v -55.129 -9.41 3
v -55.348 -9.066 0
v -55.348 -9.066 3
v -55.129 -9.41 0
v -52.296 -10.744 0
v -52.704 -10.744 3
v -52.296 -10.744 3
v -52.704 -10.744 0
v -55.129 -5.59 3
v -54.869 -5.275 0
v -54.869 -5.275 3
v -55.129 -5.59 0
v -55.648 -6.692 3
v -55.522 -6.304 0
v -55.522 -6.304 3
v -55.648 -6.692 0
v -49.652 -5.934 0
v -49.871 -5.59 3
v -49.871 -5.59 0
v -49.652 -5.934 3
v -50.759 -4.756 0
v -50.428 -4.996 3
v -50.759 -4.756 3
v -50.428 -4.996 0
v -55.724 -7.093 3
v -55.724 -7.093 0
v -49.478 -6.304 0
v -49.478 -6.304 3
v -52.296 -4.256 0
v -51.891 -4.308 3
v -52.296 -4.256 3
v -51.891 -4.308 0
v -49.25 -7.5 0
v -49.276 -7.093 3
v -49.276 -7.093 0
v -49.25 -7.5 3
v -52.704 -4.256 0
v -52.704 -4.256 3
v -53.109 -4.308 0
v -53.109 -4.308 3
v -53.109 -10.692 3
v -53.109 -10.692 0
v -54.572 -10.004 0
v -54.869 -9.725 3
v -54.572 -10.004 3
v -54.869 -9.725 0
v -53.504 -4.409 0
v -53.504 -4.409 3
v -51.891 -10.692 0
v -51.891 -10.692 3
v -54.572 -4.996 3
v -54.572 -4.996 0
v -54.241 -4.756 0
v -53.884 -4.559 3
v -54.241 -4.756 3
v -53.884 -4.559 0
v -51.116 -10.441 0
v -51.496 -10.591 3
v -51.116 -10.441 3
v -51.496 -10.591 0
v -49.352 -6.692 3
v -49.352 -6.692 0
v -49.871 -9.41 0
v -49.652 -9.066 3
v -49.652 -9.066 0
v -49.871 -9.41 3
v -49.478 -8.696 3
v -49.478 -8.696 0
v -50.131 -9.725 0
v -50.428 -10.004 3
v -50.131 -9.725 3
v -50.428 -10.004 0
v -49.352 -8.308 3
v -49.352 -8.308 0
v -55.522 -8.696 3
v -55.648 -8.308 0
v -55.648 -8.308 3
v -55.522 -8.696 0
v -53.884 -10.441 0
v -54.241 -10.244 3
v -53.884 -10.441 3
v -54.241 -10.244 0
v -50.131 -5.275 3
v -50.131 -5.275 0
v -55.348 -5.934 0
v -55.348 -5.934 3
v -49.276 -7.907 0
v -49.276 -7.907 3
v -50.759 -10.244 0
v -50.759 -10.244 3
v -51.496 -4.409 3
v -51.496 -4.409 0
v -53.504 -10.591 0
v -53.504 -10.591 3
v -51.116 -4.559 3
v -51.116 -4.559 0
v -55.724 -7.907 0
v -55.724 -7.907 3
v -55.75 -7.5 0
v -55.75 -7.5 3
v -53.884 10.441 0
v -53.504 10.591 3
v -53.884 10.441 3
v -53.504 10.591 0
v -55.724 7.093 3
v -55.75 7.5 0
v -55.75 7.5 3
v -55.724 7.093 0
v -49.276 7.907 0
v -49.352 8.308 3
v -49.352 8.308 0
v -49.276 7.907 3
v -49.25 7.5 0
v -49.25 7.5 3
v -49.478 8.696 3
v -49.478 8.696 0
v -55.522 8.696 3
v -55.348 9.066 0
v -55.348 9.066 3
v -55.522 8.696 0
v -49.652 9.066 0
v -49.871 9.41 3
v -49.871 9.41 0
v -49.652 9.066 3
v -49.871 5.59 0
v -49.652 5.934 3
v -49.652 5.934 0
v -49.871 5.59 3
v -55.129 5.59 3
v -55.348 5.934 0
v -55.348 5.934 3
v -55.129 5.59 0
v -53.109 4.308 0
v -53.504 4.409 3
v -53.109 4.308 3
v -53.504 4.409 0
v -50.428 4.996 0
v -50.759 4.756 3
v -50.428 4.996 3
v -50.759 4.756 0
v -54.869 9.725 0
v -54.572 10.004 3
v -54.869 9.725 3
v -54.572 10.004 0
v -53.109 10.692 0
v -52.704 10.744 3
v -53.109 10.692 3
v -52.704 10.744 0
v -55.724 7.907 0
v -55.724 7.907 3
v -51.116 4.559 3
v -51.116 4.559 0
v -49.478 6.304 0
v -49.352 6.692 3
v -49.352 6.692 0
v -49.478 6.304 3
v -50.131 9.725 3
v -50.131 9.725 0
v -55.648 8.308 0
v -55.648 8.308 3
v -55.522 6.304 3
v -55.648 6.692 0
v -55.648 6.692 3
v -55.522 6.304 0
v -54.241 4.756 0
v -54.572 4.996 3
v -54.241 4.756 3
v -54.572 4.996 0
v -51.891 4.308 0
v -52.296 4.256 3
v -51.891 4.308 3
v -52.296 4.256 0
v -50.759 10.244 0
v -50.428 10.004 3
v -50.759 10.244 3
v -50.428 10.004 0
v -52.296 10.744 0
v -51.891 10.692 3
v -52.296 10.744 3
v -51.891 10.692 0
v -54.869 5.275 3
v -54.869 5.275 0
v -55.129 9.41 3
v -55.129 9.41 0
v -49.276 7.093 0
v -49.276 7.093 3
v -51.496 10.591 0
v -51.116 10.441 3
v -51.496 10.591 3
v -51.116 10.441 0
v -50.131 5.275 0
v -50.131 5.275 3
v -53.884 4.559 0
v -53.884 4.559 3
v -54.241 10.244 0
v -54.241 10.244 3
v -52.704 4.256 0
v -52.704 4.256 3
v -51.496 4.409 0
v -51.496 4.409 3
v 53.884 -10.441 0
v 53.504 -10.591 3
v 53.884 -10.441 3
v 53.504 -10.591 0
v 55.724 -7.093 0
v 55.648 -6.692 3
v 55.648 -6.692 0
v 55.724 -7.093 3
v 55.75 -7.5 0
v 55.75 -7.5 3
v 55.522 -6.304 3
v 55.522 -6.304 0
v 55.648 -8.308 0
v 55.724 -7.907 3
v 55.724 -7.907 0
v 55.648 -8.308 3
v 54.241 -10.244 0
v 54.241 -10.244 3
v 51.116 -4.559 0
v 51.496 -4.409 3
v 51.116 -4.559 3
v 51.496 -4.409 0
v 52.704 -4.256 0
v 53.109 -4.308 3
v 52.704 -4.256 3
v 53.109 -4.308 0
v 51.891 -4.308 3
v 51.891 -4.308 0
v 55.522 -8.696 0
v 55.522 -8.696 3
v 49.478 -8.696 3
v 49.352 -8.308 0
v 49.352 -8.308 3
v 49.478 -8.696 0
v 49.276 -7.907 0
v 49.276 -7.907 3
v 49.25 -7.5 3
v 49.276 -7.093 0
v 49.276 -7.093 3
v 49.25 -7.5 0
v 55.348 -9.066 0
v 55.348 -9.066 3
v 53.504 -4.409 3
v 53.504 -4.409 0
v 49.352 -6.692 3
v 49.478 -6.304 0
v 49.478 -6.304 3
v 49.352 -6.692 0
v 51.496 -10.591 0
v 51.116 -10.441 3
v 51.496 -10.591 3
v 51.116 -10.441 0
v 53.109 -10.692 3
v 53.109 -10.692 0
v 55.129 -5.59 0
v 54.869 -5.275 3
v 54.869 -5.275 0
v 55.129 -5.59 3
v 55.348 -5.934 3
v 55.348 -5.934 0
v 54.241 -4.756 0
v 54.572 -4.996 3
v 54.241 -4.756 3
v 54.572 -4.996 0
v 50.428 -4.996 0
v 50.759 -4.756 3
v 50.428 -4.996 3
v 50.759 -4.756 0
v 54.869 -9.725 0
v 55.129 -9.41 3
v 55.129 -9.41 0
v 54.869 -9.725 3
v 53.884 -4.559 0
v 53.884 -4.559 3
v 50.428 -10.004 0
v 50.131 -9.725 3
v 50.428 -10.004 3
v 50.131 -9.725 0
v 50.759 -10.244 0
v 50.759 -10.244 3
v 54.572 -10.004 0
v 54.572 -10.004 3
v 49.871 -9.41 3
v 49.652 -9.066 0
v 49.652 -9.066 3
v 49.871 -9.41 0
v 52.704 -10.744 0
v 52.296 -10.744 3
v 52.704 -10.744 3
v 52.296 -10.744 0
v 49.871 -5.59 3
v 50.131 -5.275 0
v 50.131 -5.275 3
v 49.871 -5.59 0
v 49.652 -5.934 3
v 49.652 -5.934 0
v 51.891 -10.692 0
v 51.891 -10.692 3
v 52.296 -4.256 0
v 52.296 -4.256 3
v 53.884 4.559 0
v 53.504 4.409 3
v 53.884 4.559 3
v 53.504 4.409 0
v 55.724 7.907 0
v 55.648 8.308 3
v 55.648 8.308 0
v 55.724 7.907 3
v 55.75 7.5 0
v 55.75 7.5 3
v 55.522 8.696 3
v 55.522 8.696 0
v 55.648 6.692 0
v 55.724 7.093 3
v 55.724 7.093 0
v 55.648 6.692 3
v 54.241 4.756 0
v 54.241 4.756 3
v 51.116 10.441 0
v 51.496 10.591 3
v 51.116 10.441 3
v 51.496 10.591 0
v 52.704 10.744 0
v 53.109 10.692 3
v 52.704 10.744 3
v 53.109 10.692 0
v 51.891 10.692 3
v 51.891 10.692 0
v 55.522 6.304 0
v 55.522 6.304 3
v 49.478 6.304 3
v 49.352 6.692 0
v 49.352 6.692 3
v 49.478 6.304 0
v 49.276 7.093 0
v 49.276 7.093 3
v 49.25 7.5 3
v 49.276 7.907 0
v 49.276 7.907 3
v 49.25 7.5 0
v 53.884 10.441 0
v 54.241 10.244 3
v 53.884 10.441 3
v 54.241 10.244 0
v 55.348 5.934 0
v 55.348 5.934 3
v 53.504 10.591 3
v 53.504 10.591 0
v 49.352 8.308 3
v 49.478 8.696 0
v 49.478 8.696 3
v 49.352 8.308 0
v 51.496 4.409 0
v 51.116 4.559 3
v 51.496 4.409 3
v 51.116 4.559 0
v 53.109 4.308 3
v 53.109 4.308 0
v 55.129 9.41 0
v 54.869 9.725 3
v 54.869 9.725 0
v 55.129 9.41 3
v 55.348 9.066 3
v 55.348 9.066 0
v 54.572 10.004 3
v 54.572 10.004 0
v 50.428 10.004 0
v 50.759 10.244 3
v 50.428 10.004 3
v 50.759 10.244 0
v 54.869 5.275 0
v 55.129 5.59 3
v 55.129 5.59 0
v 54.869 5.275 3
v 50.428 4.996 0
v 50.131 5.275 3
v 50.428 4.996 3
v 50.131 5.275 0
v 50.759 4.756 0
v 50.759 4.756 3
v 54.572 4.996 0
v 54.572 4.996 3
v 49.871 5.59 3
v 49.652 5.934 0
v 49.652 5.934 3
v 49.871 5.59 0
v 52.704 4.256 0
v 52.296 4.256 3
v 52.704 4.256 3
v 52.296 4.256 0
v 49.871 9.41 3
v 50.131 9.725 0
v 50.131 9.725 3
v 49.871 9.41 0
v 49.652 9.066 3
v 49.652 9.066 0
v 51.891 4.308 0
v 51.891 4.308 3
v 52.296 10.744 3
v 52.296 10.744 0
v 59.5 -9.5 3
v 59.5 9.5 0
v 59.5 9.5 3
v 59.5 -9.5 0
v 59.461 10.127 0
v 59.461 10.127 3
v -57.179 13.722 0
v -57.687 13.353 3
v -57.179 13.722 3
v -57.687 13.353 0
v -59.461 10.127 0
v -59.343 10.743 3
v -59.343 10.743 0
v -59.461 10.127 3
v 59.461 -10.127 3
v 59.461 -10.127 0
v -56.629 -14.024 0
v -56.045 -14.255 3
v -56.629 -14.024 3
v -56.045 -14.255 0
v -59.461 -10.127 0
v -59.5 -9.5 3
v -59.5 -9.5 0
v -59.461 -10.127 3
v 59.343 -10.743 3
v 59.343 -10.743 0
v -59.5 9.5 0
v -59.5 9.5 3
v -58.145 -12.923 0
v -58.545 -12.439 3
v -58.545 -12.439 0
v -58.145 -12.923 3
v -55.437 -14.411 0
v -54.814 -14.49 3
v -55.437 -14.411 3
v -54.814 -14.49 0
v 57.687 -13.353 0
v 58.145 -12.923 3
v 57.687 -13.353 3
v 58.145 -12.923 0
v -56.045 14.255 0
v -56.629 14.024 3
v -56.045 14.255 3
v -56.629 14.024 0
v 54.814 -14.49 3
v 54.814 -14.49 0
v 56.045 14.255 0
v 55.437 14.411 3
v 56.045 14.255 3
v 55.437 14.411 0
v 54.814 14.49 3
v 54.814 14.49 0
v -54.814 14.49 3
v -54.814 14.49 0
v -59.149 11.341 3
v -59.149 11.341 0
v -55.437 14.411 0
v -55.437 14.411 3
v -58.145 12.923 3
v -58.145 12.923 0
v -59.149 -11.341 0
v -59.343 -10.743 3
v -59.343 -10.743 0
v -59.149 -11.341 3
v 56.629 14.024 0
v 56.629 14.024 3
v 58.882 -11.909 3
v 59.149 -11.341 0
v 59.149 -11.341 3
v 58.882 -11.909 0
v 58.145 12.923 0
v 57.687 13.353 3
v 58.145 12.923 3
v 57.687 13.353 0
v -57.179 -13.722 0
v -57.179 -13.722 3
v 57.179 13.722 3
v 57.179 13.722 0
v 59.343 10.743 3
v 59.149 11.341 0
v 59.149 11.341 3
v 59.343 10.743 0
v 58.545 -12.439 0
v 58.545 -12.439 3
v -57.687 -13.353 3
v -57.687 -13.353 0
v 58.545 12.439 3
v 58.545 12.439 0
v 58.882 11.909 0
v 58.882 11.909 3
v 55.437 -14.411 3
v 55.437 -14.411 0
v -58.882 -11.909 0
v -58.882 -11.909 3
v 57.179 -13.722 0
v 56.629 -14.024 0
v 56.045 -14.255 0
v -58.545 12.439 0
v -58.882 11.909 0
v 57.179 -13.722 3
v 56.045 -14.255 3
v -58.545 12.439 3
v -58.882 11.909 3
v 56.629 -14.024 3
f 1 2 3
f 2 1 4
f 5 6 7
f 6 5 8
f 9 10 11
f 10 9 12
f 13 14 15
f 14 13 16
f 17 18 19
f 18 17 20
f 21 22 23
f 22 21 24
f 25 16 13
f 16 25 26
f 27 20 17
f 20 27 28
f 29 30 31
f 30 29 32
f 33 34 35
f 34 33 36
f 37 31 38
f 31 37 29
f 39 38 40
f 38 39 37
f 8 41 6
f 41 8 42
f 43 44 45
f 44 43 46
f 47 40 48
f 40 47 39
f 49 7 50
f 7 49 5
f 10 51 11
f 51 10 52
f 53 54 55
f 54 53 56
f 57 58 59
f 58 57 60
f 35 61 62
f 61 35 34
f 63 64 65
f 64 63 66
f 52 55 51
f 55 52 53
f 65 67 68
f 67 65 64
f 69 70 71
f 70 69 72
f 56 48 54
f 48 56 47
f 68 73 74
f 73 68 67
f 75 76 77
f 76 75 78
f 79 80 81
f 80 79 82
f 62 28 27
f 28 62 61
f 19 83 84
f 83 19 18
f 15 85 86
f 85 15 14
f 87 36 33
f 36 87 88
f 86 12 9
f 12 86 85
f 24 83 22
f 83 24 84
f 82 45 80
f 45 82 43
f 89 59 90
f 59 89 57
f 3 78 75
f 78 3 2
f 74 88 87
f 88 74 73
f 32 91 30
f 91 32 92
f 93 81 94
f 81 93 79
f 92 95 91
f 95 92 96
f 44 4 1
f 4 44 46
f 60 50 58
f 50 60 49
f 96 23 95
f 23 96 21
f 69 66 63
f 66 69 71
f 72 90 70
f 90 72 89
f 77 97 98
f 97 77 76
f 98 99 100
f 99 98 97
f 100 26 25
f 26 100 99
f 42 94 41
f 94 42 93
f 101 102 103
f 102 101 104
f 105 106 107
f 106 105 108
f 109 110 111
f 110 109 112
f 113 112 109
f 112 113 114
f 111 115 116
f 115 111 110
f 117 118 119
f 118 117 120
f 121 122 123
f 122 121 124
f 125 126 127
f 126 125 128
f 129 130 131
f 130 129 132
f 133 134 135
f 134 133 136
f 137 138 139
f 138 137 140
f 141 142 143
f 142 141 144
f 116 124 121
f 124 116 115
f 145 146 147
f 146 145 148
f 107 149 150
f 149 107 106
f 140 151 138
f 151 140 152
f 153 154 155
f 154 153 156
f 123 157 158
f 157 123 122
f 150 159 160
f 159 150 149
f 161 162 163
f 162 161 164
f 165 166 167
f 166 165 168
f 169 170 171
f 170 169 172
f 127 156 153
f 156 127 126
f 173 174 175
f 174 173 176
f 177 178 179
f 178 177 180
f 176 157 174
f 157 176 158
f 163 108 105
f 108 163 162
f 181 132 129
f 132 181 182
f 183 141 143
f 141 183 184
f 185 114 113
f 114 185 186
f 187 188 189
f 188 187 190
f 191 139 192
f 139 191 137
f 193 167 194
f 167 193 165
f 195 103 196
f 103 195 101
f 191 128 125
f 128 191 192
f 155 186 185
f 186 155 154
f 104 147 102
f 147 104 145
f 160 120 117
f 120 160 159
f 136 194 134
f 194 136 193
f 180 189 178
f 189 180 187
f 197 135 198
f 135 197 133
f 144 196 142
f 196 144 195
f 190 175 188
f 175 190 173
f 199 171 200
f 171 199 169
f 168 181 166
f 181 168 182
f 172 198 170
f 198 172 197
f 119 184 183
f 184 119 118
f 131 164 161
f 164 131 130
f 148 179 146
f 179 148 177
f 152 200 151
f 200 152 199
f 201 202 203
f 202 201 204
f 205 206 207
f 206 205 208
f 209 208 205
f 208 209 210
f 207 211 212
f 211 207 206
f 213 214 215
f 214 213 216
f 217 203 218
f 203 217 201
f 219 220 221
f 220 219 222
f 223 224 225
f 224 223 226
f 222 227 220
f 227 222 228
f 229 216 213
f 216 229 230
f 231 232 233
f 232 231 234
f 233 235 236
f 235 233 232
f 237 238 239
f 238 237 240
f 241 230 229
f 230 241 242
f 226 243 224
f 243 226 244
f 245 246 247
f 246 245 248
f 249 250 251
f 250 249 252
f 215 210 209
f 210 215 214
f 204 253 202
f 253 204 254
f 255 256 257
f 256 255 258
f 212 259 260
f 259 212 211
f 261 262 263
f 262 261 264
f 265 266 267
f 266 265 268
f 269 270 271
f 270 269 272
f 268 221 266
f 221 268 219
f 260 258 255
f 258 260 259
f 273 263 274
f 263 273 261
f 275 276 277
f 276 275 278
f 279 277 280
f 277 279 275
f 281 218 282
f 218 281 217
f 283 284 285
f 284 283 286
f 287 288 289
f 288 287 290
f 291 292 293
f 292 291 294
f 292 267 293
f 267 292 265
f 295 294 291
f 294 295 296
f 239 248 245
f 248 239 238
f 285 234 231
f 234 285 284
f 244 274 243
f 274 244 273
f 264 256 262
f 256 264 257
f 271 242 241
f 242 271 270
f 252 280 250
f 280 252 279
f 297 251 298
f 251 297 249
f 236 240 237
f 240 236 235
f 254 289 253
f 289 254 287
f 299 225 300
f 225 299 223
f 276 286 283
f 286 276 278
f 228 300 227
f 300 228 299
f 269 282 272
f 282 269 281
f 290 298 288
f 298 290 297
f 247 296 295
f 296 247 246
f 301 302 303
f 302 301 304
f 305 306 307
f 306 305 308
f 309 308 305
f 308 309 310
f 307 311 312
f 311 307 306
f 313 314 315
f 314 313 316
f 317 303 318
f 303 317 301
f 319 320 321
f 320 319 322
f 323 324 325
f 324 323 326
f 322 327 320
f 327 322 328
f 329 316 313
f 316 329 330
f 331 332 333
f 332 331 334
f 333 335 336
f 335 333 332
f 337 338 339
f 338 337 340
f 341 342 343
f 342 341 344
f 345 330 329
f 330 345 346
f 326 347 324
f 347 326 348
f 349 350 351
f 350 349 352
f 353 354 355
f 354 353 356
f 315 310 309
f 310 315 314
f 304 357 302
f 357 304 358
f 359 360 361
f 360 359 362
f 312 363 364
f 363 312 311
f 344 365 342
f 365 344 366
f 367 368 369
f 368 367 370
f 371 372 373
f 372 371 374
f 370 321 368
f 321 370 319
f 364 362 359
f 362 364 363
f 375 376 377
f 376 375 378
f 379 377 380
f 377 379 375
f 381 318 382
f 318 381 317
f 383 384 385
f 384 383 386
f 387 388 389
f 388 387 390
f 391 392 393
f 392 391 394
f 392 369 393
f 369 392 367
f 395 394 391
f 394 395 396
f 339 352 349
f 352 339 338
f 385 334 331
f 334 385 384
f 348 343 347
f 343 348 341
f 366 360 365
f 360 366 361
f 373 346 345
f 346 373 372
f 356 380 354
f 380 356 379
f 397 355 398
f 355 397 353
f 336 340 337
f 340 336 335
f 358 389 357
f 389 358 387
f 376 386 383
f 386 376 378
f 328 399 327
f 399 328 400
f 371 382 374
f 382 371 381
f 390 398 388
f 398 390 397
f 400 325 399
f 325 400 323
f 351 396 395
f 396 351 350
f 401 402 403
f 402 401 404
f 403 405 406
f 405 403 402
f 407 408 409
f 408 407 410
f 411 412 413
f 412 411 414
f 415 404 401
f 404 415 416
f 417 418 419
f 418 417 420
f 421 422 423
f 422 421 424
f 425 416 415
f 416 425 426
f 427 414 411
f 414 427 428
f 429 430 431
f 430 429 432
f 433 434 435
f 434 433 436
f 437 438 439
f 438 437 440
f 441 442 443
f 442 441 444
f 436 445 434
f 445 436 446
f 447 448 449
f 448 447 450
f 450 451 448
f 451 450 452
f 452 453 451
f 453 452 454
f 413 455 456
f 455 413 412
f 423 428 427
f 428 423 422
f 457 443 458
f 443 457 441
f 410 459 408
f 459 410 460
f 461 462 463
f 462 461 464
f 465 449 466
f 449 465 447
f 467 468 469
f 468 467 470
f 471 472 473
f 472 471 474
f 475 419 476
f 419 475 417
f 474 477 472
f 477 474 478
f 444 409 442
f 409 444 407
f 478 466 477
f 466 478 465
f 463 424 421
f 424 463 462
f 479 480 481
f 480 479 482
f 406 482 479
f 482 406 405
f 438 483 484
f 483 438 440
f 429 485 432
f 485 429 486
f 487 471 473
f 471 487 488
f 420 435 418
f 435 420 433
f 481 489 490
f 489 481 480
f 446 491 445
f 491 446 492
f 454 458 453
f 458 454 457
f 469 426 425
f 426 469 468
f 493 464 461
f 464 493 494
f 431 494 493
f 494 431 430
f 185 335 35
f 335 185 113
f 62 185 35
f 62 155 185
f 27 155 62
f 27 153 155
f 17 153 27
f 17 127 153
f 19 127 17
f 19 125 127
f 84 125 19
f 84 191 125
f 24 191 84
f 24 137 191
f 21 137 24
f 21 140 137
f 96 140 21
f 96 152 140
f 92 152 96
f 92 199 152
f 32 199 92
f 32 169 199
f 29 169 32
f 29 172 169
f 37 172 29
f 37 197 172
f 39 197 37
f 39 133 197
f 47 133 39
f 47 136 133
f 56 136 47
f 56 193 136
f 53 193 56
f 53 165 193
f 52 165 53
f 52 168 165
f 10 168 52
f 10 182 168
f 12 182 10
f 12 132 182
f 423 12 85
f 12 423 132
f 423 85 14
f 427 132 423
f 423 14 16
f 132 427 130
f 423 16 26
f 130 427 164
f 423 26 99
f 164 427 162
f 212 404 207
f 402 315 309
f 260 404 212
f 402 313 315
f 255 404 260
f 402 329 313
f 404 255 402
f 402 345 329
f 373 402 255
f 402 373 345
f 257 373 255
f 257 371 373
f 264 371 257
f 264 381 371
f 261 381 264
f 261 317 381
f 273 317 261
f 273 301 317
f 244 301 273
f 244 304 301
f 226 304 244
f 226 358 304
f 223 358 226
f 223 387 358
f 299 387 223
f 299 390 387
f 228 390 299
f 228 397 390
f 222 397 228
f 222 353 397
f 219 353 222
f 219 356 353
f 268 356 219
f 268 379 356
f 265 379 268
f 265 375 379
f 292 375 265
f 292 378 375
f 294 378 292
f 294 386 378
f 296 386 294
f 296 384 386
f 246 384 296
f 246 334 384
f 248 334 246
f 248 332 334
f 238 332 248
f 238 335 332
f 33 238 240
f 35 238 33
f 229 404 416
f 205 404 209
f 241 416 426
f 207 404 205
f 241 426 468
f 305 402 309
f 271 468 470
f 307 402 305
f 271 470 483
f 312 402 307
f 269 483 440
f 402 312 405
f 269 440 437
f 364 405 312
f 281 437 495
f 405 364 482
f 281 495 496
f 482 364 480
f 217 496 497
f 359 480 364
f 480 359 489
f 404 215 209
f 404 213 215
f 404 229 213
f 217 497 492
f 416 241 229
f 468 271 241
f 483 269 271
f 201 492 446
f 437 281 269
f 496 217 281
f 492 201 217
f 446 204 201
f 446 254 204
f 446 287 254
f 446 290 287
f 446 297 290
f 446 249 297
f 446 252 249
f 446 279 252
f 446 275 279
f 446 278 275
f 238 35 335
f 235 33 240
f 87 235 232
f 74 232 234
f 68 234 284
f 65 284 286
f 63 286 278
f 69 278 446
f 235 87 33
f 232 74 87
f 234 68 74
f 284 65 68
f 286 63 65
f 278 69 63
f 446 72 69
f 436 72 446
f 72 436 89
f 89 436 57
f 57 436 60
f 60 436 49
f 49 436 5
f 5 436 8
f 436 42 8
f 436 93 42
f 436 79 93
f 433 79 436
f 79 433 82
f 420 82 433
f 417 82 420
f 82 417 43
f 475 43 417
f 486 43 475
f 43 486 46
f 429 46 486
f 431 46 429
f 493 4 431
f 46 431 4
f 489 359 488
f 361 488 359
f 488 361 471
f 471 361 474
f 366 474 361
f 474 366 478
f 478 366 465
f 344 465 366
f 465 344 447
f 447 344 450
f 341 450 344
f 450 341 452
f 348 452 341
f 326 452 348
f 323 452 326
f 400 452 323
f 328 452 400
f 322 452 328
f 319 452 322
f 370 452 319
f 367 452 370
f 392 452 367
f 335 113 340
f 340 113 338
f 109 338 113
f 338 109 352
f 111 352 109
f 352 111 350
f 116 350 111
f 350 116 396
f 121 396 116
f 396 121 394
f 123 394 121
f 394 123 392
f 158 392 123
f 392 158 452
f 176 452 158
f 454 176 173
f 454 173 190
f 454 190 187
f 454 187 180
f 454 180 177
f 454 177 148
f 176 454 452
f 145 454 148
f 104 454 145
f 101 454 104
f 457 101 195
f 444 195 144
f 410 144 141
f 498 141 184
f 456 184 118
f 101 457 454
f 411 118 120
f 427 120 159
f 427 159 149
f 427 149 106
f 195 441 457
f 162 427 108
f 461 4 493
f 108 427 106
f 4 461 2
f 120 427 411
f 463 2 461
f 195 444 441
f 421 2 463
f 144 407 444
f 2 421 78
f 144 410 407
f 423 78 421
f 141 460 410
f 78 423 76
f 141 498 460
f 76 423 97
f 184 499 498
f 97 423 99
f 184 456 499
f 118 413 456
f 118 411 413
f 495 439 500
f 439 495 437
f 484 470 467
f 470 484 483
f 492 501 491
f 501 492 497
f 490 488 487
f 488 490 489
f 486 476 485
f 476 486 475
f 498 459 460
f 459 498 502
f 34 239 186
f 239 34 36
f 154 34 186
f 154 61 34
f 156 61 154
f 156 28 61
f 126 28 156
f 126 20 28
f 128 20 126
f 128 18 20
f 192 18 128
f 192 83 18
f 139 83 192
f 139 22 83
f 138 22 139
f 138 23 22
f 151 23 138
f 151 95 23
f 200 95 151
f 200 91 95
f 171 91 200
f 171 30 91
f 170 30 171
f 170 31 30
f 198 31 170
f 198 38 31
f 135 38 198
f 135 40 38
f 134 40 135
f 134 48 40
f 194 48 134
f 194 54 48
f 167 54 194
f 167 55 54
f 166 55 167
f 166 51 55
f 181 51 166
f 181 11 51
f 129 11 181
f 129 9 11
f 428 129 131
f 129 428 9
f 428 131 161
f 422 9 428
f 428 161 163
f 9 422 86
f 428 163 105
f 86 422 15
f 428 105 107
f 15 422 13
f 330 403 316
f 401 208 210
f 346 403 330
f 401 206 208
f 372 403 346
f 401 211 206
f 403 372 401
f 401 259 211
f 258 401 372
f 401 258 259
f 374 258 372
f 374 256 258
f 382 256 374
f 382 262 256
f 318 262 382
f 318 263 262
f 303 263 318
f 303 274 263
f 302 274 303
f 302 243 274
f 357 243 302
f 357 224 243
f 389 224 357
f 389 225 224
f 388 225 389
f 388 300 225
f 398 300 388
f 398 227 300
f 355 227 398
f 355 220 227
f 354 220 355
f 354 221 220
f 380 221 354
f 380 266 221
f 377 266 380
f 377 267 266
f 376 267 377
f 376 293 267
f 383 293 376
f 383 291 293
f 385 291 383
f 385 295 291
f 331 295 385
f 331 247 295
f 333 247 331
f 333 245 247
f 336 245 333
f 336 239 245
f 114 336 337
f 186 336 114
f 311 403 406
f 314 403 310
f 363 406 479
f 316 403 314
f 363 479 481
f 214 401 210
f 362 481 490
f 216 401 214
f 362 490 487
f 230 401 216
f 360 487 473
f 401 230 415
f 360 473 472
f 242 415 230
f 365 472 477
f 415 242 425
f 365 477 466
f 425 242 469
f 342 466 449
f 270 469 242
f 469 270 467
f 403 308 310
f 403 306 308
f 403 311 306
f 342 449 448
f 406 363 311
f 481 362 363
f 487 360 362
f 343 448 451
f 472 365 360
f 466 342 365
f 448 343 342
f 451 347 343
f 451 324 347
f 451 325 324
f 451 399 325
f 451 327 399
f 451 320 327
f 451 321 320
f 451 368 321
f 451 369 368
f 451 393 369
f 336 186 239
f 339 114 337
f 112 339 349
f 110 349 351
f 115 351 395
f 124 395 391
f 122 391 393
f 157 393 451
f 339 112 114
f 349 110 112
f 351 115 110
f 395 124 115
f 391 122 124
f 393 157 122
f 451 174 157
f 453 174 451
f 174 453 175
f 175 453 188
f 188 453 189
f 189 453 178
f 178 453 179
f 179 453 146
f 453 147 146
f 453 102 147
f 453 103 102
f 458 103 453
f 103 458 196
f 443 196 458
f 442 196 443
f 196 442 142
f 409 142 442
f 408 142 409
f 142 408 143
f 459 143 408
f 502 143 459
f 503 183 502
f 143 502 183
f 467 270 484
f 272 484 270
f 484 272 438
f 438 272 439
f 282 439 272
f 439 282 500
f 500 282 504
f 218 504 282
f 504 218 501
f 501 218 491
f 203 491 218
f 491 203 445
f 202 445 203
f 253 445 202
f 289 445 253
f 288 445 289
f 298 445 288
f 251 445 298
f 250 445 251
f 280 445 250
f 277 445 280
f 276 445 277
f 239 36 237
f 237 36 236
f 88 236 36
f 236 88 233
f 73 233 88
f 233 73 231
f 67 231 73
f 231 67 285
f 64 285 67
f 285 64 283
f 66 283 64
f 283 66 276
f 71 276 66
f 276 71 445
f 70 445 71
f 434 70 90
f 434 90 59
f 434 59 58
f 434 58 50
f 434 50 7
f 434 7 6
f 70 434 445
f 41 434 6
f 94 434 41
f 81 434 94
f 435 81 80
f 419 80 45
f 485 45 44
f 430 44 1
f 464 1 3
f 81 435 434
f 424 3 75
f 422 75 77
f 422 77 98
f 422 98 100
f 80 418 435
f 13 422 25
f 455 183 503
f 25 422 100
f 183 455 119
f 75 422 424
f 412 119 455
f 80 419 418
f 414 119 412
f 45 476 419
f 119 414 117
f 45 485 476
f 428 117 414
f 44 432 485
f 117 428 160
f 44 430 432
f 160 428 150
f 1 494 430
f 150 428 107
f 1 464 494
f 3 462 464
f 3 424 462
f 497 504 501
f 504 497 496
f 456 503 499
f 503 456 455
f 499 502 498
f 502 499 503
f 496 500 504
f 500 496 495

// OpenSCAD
$fn = 50;


difference() {
	union() {
		hull() {
			translate(v = [-54.5000000000, 9.5000000000, 0]) {
				cylinder(h = 3, r = 5);
			}
			translate(v = [54.5000000000, 9.5000000000, 0]) {
				cylinder(h = 3, r = 5);
			}
			translate(v = [-54.5000000000, -9.5000000000, 0]) {
				cylinder(h = 3, r = 5);
			}
			translate(v = [54.5000000000, -9.5000000000, 0]) {
				cylinder(h = 3, r = 5);
			}
		}
	}
	union() {
		translate(v = [-52.5000000000, -7.5000000000, -100.0000000000]) {
			cylinder(h = 200, r = 3.2500000000);
		}
		translate(v = [-52.5000000000, 7.5000000000, -100.0000000000]) {
			cylinder(h = 200, r = 3.2500000000);
		}
		translate(v = [52.5000000000, -7.5000000000, -100.0000000000]) {
			cylinder(h = 200, r = 3.2500000000);
		}
		translate(v = [52.5000000000, 7.5000000000, -100.0000000000]) {
			cylinder(h = 200, r = 3.2500000000);
		}
	}
}
